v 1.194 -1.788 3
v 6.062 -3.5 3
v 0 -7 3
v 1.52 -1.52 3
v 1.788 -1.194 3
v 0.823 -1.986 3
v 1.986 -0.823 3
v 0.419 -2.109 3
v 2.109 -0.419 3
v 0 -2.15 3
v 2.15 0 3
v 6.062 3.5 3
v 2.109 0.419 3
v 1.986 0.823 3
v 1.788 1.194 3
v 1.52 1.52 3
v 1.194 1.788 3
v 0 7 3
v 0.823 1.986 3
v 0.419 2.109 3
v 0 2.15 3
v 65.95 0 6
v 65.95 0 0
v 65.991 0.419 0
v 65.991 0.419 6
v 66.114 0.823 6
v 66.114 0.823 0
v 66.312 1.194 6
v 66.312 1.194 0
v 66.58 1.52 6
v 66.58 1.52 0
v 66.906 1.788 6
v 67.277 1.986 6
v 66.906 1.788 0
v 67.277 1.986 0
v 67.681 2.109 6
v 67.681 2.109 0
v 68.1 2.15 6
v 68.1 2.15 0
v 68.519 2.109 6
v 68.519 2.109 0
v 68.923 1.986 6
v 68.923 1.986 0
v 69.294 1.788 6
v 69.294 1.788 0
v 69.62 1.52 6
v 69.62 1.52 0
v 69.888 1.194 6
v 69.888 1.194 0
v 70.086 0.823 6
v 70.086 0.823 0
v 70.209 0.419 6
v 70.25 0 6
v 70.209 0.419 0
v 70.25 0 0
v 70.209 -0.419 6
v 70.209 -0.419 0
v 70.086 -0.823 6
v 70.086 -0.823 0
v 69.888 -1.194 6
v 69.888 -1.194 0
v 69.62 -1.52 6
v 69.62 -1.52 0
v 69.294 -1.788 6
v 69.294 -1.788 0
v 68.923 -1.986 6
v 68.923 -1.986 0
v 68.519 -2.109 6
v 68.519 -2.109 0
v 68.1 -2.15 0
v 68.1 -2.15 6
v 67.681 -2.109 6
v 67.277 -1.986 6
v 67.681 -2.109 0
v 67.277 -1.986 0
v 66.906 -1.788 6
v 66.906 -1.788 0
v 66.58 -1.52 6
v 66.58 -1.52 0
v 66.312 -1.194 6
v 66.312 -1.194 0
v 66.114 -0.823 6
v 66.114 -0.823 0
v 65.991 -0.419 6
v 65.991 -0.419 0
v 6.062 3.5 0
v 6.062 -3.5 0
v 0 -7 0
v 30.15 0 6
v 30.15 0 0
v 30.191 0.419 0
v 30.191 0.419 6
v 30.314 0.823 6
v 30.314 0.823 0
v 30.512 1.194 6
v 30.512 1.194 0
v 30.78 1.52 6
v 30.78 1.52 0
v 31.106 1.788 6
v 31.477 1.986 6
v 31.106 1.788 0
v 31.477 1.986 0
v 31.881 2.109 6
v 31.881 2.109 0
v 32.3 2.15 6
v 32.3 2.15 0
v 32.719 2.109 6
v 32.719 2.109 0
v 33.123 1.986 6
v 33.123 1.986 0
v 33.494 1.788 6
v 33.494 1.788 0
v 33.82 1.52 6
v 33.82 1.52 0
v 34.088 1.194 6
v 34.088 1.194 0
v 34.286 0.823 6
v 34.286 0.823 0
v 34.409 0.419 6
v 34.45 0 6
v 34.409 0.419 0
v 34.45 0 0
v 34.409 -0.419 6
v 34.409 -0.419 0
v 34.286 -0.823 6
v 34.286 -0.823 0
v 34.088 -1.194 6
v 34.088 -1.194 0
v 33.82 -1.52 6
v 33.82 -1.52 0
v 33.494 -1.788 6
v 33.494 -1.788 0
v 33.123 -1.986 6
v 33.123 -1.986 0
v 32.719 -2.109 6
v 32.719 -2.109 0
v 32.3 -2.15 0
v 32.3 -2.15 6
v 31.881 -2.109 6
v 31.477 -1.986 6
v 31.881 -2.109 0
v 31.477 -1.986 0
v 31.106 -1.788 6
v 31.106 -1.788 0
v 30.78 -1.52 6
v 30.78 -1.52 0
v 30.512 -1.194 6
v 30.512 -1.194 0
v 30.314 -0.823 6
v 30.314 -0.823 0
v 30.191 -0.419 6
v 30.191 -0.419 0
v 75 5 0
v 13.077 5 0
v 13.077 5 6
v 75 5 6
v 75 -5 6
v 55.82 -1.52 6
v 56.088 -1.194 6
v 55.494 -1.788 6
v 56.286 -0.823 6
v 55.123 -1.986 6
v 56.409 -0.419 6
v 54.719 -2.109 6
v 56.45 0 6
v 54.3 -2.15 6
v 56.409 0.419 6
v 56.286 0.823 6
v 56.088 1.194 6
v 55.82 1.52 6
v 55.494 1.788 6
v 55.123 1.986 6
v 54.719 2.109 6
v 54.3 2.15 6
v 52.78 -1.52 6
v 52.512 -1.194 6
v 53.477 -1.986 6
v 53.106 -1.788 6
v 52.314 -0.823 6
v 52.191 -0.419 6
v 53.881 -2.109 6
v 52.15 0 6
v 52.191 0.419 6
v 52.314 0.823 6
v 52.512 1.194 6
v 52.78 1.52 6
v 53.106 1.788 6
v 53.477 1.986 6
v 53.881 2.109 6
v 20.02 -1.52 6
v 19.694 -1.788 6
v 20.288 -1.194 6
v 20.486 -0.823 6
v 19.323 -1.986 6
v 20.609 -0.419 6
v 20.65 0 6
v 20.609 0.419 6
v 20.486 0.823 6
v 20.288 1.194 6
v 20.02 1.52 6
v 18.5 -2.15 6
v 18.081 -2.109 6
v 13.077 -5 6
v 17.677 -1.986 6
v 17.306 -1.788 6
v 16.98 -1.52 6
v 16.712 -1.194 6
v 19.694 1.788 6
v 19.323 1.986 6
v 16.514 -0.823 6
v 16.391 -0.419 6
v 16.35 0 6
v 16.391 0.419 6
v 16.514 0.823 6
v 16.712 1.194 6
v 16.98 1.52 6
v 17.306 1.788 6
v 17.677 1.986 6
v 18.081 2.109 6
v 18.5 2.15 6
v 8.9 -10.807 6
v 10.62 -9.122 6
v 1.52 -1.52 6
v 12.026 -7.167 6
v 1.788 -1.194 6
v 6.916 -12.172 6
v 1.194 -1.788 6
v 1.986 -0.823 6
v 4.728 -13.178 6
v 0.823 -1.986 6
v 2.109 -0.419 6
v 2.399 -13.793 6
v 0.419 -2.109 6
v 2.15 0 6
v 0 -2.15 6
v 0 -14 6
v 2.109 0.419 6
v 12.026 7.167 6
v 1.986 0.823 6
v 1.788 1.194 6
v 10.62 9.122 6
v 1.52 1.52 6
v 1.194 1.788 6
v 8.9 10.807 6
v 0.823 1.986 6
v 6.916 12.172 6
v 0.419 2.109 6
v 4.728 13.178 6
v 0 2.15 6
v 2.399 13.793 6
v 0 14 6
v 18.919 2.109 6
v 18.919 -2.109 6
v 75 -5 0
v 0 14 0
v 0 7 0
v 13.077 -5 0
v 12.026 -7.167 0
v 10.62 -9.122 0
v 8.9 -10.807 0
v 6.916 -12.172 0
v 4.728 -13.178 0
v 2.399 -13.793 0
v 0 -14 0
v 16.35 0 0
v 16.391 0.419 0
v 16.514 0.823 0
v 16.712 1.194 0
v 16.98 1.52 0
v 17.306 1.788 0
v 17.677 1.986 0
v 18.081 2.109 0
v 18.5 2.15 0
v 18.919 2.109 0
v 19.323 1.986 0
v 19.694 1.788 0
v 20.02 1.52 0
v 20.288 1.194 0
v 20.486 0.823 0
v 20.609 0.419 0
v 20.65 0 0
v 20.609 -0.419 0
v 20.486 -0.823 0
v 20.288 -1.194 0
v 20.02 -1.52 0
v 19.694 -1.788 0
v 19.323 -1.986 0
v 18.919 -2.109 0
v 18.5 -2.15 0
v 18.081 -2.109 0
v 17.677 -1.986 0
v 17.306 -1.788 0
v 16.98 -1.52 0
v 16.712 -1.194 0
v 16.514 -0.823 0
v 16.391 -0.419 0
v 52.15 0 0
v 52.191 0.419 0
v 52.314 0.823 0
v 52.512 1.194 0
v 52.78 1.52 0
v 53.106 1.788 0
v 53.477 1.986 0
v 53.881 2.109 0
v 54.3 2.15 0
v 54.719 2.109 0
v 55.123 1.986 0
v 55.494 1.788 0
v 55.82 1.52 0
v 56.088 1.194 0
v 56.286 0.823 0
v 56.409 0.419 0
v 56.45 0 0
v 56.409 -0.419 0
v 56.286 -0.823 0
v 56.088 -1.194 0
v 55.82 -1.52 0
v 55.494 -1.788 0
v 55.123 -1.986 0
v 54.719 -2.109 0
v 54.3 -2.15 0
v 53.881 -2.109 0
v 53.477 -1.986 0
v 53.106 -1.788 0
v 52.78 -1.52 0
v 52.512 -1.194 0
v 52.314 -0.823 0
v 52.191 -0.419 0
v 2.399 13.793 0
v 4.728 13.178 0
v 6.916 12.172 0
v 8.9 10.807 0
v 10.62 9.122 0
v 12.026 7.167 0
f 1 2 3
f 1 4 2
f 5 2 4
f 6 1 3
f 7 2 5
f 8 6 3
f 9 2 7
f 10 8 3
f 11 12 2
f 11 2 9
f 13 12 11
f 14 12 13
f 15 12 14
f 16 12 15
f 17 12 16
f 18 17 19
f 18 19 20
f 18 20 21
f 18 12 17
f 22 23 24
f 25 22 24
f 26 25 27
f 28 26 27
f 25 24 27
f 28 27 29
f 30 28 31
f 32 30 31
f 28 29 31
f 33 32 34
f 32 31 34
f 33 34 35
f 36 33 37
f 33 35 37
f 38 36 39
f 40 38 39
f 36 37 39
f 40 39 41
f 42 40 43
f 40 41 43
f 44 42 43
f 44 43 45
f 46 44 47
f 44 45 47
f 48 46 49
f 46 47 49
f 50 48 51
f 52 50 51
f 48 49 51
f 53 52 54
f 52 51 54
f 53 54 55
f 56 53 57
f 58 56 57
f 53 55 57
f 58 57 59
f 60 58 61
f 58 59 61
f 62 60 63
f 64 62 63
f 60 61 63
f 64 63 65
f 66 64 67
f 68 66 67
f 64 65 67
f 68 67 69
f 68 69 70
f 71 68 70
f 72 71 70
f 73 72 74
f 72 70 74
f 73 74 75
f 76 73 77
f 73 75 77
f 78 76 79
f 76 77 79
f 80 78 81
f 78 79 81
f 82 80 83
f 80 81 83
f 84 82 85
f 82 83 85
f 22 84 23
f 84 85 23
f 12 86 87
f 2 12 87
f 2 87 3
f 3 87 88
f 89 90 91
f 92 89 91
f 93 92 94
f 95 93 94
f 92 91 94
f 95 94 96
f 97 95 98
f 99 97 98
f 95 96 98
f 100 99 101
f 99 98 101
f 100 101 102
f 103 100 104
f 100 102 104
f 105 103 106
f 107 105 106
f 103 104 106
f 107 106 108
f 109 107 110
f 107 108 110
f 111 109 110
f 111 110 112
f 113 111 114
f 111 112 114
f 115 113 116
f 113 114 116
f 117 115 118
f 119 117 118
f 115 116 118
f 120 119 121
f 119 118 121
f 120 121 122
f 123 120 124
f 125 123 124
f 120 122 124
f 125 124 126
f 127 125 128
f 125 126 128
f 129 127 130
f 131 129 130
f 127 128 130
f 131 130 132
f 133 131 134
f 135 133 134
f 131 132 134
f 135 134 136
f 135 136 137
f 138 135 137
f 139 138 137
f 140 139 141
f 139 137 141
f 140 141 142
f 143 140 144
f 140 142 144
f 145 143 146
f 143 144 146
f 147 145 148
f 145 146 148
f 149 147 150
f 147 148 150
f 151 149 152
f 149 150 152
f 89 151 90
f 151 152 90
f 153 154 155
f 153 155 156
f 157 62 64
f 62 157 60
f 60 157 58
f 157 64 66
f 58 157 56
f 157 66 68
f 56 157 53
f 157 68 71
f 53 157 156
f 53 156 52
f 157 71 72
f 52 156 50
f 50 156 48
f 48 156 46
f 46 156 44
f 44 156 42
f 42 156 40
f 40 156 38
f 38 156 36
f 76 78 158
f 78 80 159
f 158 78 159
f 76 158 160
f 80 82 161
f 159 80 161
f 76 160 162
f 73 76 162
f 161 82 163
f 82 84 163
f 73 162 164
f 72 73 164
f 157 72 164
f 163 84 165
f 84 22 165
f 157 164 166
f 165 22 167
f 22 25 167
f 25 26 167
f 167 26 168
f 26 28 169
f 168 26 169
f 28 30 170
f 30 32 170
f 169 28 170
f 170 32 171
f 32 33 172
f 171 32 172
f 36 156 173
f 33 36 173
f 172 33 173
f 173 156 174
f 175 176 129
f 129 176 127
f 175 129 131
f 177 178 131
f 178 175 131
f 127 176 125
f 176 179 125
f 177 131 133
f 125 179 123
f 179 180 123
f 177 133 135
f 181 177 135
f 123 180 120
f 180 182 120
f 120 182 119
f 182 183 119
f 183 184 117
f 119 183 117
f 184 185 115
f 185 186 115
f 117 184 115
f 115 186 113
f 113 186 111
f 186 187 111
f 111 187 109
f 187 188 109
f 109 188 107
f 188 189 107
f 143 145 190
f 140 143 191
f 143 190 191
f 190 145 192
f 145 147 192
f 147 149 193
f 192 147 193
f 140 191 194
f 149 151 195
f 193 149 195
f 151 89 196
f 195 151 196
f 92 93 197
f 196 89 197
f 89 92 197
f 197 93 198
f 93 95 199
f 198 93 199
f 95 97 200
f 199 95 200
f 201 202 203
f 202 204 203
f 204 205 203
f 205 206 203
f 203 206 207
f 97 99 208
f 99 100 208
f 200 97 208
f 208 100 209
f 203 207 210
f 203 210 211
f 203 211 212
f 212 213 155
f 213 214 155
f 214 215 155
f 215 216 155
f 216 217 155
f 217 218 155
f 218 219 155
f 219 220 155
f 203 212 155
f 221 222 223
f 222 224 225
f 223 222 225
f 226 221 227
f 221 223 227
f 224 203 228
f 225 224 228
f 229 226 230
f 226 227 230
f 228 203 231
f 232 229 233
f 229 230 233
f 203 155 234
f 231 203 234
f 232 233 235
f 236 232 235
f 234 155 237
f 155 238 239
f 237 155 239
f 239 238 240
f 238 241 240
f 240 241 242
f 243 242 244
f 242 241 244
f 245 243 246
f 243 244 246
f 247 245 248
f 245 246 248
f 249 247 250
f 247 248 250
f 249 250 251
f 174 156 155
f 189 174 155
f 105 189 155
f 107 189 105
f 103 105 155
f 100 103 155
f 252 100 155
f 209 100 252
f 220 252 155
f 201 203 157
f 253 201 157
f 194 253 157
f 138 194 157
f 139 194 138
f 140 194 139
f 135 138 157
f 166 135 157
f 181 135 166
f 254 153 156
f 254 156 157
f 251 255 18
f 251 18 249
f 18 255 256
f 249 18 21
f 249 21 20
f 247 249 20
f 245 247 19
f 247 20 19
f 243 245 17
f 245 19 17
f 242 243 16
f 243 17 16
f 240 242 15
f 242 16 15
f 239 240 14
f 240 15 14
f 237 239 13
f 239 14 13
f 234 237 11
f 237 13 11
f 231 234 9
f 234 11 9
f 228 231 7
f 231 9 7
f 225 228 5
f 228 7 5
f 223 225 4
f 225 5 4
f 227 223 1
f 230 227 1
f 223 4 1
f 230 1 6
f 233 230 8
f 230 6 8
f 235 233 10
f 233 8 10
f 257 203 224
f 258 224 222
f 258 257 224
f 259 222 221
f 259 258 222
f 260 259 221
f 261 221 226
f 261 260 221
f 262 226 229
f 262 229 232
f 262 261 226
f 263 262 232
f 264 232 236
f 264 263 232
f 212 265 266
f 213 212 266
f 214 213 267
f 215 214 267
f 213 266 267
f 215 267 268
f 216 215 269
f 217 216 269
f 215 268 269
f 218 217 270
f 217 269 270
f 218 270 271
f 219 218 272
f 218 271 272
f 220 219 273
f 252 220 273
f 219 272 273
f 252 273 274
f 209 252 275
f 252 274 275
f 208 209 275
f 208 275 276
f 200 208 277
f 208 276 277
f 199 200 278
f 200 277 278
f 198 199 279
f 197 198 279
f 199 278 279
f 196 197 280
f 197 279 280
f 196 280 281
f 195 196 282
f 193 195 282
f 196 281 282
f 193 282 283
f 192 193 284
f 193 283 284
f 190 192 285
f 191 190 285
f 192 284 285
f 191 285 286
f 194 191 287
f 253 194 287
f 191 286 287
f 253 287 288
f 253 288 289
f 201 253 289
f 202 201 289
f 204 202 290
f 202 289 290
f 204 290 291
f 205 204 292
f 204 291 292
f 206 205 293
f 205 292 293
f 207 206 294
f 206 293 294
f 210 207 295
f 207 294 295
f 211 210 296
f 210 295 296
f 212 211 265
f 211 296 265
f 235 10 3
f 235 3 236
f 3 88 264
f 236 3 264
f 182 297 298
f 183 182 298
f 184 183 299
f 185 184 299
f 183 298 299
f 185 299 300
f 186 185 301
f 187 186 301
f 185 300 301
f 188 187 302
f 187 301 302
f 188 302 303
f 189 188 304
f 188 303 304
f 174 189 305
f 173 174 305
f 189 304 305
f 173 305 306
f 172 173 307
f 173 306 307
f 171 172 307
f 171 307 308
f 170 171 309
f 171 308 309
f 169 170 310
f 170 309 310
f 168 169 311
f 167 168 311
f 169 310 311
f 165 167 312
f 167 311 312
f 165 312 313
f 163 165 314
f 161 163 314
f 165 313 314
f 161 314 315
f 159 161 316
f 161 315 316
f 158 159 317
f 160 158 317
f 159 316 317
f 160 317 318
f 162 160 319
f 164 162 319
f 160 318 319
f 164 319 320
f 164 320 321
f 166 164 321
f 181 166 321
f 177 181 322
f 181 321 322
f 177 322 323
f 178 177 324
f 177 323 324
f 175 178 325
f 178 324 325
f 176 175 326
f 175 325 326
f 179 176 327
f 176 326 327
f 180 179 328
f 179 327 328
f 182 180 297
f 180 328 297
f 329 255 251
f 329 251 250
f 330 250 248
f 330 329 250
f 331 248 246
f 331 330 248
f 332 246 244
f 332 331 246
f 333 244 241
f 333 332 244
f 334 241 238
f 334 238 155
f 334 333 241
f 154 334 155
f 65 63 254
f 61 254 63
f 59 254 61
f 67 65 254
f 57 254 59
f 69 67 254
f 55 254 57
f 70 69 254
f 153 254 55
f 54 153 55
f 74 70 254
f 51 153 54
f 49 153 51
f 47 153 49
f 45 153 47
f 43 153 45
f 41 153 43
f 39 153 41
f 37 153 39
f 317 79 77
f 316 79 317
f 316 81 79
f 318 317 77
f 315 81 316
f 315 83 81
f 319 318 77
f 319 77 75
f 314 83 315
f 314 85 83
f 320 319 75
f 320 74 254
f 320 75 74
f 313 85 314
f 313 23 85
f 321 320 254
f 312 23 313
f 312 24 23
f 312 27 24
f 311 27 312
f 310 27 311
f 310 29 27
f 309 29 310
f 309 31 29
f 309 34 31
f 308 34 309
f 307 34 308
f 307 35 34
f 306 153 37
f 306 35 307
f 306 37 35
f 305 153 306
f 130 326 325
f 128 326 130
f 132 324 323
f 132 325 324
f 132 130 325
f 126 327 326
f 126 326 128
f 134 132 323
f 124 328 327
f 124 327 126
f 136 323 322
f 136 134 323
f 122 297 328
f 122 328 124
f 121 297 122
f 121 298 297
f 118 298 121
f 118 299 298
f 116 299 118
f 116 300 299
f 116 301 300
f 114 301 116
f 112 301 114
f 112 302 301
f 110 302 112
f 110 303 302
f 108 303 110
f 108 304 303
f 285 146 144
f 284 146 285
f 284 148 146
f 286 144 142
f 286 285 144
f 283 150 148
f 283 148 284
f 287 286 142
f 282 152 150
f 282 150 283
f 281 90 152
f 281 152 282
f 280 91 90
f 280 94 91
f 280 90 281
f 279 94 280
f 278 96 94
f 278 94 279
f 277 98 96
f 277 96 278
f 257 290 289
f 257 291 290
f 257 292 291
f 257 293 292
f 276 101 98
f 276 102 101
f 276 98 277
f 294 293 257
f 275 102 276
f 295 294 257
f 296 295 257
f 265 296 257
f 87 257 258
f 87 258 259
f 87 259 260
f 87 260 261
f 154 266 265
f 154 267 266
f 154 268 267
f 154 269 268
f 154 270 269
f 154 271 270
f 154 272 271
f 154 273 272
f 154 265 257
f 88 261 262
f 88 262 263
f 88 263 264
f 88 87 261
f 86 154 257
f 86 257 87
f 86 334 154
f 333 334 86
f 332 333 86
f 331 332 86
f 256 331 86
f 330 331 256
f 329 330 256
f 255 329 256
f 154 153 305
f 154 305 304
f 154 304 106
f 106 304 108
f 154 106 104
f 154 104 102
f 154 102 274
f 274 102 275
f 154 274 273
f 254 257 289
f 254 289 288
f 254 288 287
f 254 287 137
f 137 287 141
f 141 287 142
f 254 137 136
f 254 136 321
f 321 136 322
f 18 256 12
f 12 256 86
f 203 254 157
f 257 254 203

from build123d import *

# Parameters (mm, degrees)
SKETCH_R     = 2.15
PAD_DEPTH    = 6
POCKET_DEPTH = 3


with BuildPart() as body:
    # Sketch → Pad (new body)
    with BuildSketch(Plane.XY):
        with BuildLine():
            Line((-13.076697, 5), (-75, 5))
            Line((-75, 5), (-75, -5))
            Line((-75, -5), (-13.076697, -5))
            ThreePointArc((-13.076697, -5), (-7.937254, -11.532563), (0, -14))
            Line((0, -2.15), (0, -14))
            ThreePointArc((0, 2.15), (-2.15, 0), (0, -2.15))
            Line((0, 14), (0, 2.15))
            ThreePointArc((0, 14), (-7.937254, 11.532563), (-13.076697, 5))
        make_face()
        with Locations((-68.1, 0)):
            Circle(SKETCH_R, mode=Mode.SUBTRACT)
        with Locations((-54.3, 0)):
            Circle(SKETCH_R, mode=Mode.SUBTRACT)
        with Locations((-32.3, 0)):
            Circle(SKETCH_R, mode=Mode.SUBTRACT)
        with Locations((-18.5, 0)):
            Circle(SKETCH_R, mode=Mode.SUBTRACT)
    extrude(amount=PAD_DEPTH)

    # Sketch001 → Pocket (cut)
    with BuildSketch(Plane.XY):
        Polygon((0, 7), (-6.062178, 3.5), (-6.062178, -3.5), (0, -7), align=None)
    extrude(amount=POCKET_DEPTH, mode=Mode.SUBTRACT)


with BuildPart() as part_mirroring:
    # Part__Mirroring: instance of Body
    add(body.part.mirror(Plane(origin=(0, 0, 0), x_dir=(0, -1, 0), z_dir=(1, 0, 0))))


solid = part_mirroring.part
